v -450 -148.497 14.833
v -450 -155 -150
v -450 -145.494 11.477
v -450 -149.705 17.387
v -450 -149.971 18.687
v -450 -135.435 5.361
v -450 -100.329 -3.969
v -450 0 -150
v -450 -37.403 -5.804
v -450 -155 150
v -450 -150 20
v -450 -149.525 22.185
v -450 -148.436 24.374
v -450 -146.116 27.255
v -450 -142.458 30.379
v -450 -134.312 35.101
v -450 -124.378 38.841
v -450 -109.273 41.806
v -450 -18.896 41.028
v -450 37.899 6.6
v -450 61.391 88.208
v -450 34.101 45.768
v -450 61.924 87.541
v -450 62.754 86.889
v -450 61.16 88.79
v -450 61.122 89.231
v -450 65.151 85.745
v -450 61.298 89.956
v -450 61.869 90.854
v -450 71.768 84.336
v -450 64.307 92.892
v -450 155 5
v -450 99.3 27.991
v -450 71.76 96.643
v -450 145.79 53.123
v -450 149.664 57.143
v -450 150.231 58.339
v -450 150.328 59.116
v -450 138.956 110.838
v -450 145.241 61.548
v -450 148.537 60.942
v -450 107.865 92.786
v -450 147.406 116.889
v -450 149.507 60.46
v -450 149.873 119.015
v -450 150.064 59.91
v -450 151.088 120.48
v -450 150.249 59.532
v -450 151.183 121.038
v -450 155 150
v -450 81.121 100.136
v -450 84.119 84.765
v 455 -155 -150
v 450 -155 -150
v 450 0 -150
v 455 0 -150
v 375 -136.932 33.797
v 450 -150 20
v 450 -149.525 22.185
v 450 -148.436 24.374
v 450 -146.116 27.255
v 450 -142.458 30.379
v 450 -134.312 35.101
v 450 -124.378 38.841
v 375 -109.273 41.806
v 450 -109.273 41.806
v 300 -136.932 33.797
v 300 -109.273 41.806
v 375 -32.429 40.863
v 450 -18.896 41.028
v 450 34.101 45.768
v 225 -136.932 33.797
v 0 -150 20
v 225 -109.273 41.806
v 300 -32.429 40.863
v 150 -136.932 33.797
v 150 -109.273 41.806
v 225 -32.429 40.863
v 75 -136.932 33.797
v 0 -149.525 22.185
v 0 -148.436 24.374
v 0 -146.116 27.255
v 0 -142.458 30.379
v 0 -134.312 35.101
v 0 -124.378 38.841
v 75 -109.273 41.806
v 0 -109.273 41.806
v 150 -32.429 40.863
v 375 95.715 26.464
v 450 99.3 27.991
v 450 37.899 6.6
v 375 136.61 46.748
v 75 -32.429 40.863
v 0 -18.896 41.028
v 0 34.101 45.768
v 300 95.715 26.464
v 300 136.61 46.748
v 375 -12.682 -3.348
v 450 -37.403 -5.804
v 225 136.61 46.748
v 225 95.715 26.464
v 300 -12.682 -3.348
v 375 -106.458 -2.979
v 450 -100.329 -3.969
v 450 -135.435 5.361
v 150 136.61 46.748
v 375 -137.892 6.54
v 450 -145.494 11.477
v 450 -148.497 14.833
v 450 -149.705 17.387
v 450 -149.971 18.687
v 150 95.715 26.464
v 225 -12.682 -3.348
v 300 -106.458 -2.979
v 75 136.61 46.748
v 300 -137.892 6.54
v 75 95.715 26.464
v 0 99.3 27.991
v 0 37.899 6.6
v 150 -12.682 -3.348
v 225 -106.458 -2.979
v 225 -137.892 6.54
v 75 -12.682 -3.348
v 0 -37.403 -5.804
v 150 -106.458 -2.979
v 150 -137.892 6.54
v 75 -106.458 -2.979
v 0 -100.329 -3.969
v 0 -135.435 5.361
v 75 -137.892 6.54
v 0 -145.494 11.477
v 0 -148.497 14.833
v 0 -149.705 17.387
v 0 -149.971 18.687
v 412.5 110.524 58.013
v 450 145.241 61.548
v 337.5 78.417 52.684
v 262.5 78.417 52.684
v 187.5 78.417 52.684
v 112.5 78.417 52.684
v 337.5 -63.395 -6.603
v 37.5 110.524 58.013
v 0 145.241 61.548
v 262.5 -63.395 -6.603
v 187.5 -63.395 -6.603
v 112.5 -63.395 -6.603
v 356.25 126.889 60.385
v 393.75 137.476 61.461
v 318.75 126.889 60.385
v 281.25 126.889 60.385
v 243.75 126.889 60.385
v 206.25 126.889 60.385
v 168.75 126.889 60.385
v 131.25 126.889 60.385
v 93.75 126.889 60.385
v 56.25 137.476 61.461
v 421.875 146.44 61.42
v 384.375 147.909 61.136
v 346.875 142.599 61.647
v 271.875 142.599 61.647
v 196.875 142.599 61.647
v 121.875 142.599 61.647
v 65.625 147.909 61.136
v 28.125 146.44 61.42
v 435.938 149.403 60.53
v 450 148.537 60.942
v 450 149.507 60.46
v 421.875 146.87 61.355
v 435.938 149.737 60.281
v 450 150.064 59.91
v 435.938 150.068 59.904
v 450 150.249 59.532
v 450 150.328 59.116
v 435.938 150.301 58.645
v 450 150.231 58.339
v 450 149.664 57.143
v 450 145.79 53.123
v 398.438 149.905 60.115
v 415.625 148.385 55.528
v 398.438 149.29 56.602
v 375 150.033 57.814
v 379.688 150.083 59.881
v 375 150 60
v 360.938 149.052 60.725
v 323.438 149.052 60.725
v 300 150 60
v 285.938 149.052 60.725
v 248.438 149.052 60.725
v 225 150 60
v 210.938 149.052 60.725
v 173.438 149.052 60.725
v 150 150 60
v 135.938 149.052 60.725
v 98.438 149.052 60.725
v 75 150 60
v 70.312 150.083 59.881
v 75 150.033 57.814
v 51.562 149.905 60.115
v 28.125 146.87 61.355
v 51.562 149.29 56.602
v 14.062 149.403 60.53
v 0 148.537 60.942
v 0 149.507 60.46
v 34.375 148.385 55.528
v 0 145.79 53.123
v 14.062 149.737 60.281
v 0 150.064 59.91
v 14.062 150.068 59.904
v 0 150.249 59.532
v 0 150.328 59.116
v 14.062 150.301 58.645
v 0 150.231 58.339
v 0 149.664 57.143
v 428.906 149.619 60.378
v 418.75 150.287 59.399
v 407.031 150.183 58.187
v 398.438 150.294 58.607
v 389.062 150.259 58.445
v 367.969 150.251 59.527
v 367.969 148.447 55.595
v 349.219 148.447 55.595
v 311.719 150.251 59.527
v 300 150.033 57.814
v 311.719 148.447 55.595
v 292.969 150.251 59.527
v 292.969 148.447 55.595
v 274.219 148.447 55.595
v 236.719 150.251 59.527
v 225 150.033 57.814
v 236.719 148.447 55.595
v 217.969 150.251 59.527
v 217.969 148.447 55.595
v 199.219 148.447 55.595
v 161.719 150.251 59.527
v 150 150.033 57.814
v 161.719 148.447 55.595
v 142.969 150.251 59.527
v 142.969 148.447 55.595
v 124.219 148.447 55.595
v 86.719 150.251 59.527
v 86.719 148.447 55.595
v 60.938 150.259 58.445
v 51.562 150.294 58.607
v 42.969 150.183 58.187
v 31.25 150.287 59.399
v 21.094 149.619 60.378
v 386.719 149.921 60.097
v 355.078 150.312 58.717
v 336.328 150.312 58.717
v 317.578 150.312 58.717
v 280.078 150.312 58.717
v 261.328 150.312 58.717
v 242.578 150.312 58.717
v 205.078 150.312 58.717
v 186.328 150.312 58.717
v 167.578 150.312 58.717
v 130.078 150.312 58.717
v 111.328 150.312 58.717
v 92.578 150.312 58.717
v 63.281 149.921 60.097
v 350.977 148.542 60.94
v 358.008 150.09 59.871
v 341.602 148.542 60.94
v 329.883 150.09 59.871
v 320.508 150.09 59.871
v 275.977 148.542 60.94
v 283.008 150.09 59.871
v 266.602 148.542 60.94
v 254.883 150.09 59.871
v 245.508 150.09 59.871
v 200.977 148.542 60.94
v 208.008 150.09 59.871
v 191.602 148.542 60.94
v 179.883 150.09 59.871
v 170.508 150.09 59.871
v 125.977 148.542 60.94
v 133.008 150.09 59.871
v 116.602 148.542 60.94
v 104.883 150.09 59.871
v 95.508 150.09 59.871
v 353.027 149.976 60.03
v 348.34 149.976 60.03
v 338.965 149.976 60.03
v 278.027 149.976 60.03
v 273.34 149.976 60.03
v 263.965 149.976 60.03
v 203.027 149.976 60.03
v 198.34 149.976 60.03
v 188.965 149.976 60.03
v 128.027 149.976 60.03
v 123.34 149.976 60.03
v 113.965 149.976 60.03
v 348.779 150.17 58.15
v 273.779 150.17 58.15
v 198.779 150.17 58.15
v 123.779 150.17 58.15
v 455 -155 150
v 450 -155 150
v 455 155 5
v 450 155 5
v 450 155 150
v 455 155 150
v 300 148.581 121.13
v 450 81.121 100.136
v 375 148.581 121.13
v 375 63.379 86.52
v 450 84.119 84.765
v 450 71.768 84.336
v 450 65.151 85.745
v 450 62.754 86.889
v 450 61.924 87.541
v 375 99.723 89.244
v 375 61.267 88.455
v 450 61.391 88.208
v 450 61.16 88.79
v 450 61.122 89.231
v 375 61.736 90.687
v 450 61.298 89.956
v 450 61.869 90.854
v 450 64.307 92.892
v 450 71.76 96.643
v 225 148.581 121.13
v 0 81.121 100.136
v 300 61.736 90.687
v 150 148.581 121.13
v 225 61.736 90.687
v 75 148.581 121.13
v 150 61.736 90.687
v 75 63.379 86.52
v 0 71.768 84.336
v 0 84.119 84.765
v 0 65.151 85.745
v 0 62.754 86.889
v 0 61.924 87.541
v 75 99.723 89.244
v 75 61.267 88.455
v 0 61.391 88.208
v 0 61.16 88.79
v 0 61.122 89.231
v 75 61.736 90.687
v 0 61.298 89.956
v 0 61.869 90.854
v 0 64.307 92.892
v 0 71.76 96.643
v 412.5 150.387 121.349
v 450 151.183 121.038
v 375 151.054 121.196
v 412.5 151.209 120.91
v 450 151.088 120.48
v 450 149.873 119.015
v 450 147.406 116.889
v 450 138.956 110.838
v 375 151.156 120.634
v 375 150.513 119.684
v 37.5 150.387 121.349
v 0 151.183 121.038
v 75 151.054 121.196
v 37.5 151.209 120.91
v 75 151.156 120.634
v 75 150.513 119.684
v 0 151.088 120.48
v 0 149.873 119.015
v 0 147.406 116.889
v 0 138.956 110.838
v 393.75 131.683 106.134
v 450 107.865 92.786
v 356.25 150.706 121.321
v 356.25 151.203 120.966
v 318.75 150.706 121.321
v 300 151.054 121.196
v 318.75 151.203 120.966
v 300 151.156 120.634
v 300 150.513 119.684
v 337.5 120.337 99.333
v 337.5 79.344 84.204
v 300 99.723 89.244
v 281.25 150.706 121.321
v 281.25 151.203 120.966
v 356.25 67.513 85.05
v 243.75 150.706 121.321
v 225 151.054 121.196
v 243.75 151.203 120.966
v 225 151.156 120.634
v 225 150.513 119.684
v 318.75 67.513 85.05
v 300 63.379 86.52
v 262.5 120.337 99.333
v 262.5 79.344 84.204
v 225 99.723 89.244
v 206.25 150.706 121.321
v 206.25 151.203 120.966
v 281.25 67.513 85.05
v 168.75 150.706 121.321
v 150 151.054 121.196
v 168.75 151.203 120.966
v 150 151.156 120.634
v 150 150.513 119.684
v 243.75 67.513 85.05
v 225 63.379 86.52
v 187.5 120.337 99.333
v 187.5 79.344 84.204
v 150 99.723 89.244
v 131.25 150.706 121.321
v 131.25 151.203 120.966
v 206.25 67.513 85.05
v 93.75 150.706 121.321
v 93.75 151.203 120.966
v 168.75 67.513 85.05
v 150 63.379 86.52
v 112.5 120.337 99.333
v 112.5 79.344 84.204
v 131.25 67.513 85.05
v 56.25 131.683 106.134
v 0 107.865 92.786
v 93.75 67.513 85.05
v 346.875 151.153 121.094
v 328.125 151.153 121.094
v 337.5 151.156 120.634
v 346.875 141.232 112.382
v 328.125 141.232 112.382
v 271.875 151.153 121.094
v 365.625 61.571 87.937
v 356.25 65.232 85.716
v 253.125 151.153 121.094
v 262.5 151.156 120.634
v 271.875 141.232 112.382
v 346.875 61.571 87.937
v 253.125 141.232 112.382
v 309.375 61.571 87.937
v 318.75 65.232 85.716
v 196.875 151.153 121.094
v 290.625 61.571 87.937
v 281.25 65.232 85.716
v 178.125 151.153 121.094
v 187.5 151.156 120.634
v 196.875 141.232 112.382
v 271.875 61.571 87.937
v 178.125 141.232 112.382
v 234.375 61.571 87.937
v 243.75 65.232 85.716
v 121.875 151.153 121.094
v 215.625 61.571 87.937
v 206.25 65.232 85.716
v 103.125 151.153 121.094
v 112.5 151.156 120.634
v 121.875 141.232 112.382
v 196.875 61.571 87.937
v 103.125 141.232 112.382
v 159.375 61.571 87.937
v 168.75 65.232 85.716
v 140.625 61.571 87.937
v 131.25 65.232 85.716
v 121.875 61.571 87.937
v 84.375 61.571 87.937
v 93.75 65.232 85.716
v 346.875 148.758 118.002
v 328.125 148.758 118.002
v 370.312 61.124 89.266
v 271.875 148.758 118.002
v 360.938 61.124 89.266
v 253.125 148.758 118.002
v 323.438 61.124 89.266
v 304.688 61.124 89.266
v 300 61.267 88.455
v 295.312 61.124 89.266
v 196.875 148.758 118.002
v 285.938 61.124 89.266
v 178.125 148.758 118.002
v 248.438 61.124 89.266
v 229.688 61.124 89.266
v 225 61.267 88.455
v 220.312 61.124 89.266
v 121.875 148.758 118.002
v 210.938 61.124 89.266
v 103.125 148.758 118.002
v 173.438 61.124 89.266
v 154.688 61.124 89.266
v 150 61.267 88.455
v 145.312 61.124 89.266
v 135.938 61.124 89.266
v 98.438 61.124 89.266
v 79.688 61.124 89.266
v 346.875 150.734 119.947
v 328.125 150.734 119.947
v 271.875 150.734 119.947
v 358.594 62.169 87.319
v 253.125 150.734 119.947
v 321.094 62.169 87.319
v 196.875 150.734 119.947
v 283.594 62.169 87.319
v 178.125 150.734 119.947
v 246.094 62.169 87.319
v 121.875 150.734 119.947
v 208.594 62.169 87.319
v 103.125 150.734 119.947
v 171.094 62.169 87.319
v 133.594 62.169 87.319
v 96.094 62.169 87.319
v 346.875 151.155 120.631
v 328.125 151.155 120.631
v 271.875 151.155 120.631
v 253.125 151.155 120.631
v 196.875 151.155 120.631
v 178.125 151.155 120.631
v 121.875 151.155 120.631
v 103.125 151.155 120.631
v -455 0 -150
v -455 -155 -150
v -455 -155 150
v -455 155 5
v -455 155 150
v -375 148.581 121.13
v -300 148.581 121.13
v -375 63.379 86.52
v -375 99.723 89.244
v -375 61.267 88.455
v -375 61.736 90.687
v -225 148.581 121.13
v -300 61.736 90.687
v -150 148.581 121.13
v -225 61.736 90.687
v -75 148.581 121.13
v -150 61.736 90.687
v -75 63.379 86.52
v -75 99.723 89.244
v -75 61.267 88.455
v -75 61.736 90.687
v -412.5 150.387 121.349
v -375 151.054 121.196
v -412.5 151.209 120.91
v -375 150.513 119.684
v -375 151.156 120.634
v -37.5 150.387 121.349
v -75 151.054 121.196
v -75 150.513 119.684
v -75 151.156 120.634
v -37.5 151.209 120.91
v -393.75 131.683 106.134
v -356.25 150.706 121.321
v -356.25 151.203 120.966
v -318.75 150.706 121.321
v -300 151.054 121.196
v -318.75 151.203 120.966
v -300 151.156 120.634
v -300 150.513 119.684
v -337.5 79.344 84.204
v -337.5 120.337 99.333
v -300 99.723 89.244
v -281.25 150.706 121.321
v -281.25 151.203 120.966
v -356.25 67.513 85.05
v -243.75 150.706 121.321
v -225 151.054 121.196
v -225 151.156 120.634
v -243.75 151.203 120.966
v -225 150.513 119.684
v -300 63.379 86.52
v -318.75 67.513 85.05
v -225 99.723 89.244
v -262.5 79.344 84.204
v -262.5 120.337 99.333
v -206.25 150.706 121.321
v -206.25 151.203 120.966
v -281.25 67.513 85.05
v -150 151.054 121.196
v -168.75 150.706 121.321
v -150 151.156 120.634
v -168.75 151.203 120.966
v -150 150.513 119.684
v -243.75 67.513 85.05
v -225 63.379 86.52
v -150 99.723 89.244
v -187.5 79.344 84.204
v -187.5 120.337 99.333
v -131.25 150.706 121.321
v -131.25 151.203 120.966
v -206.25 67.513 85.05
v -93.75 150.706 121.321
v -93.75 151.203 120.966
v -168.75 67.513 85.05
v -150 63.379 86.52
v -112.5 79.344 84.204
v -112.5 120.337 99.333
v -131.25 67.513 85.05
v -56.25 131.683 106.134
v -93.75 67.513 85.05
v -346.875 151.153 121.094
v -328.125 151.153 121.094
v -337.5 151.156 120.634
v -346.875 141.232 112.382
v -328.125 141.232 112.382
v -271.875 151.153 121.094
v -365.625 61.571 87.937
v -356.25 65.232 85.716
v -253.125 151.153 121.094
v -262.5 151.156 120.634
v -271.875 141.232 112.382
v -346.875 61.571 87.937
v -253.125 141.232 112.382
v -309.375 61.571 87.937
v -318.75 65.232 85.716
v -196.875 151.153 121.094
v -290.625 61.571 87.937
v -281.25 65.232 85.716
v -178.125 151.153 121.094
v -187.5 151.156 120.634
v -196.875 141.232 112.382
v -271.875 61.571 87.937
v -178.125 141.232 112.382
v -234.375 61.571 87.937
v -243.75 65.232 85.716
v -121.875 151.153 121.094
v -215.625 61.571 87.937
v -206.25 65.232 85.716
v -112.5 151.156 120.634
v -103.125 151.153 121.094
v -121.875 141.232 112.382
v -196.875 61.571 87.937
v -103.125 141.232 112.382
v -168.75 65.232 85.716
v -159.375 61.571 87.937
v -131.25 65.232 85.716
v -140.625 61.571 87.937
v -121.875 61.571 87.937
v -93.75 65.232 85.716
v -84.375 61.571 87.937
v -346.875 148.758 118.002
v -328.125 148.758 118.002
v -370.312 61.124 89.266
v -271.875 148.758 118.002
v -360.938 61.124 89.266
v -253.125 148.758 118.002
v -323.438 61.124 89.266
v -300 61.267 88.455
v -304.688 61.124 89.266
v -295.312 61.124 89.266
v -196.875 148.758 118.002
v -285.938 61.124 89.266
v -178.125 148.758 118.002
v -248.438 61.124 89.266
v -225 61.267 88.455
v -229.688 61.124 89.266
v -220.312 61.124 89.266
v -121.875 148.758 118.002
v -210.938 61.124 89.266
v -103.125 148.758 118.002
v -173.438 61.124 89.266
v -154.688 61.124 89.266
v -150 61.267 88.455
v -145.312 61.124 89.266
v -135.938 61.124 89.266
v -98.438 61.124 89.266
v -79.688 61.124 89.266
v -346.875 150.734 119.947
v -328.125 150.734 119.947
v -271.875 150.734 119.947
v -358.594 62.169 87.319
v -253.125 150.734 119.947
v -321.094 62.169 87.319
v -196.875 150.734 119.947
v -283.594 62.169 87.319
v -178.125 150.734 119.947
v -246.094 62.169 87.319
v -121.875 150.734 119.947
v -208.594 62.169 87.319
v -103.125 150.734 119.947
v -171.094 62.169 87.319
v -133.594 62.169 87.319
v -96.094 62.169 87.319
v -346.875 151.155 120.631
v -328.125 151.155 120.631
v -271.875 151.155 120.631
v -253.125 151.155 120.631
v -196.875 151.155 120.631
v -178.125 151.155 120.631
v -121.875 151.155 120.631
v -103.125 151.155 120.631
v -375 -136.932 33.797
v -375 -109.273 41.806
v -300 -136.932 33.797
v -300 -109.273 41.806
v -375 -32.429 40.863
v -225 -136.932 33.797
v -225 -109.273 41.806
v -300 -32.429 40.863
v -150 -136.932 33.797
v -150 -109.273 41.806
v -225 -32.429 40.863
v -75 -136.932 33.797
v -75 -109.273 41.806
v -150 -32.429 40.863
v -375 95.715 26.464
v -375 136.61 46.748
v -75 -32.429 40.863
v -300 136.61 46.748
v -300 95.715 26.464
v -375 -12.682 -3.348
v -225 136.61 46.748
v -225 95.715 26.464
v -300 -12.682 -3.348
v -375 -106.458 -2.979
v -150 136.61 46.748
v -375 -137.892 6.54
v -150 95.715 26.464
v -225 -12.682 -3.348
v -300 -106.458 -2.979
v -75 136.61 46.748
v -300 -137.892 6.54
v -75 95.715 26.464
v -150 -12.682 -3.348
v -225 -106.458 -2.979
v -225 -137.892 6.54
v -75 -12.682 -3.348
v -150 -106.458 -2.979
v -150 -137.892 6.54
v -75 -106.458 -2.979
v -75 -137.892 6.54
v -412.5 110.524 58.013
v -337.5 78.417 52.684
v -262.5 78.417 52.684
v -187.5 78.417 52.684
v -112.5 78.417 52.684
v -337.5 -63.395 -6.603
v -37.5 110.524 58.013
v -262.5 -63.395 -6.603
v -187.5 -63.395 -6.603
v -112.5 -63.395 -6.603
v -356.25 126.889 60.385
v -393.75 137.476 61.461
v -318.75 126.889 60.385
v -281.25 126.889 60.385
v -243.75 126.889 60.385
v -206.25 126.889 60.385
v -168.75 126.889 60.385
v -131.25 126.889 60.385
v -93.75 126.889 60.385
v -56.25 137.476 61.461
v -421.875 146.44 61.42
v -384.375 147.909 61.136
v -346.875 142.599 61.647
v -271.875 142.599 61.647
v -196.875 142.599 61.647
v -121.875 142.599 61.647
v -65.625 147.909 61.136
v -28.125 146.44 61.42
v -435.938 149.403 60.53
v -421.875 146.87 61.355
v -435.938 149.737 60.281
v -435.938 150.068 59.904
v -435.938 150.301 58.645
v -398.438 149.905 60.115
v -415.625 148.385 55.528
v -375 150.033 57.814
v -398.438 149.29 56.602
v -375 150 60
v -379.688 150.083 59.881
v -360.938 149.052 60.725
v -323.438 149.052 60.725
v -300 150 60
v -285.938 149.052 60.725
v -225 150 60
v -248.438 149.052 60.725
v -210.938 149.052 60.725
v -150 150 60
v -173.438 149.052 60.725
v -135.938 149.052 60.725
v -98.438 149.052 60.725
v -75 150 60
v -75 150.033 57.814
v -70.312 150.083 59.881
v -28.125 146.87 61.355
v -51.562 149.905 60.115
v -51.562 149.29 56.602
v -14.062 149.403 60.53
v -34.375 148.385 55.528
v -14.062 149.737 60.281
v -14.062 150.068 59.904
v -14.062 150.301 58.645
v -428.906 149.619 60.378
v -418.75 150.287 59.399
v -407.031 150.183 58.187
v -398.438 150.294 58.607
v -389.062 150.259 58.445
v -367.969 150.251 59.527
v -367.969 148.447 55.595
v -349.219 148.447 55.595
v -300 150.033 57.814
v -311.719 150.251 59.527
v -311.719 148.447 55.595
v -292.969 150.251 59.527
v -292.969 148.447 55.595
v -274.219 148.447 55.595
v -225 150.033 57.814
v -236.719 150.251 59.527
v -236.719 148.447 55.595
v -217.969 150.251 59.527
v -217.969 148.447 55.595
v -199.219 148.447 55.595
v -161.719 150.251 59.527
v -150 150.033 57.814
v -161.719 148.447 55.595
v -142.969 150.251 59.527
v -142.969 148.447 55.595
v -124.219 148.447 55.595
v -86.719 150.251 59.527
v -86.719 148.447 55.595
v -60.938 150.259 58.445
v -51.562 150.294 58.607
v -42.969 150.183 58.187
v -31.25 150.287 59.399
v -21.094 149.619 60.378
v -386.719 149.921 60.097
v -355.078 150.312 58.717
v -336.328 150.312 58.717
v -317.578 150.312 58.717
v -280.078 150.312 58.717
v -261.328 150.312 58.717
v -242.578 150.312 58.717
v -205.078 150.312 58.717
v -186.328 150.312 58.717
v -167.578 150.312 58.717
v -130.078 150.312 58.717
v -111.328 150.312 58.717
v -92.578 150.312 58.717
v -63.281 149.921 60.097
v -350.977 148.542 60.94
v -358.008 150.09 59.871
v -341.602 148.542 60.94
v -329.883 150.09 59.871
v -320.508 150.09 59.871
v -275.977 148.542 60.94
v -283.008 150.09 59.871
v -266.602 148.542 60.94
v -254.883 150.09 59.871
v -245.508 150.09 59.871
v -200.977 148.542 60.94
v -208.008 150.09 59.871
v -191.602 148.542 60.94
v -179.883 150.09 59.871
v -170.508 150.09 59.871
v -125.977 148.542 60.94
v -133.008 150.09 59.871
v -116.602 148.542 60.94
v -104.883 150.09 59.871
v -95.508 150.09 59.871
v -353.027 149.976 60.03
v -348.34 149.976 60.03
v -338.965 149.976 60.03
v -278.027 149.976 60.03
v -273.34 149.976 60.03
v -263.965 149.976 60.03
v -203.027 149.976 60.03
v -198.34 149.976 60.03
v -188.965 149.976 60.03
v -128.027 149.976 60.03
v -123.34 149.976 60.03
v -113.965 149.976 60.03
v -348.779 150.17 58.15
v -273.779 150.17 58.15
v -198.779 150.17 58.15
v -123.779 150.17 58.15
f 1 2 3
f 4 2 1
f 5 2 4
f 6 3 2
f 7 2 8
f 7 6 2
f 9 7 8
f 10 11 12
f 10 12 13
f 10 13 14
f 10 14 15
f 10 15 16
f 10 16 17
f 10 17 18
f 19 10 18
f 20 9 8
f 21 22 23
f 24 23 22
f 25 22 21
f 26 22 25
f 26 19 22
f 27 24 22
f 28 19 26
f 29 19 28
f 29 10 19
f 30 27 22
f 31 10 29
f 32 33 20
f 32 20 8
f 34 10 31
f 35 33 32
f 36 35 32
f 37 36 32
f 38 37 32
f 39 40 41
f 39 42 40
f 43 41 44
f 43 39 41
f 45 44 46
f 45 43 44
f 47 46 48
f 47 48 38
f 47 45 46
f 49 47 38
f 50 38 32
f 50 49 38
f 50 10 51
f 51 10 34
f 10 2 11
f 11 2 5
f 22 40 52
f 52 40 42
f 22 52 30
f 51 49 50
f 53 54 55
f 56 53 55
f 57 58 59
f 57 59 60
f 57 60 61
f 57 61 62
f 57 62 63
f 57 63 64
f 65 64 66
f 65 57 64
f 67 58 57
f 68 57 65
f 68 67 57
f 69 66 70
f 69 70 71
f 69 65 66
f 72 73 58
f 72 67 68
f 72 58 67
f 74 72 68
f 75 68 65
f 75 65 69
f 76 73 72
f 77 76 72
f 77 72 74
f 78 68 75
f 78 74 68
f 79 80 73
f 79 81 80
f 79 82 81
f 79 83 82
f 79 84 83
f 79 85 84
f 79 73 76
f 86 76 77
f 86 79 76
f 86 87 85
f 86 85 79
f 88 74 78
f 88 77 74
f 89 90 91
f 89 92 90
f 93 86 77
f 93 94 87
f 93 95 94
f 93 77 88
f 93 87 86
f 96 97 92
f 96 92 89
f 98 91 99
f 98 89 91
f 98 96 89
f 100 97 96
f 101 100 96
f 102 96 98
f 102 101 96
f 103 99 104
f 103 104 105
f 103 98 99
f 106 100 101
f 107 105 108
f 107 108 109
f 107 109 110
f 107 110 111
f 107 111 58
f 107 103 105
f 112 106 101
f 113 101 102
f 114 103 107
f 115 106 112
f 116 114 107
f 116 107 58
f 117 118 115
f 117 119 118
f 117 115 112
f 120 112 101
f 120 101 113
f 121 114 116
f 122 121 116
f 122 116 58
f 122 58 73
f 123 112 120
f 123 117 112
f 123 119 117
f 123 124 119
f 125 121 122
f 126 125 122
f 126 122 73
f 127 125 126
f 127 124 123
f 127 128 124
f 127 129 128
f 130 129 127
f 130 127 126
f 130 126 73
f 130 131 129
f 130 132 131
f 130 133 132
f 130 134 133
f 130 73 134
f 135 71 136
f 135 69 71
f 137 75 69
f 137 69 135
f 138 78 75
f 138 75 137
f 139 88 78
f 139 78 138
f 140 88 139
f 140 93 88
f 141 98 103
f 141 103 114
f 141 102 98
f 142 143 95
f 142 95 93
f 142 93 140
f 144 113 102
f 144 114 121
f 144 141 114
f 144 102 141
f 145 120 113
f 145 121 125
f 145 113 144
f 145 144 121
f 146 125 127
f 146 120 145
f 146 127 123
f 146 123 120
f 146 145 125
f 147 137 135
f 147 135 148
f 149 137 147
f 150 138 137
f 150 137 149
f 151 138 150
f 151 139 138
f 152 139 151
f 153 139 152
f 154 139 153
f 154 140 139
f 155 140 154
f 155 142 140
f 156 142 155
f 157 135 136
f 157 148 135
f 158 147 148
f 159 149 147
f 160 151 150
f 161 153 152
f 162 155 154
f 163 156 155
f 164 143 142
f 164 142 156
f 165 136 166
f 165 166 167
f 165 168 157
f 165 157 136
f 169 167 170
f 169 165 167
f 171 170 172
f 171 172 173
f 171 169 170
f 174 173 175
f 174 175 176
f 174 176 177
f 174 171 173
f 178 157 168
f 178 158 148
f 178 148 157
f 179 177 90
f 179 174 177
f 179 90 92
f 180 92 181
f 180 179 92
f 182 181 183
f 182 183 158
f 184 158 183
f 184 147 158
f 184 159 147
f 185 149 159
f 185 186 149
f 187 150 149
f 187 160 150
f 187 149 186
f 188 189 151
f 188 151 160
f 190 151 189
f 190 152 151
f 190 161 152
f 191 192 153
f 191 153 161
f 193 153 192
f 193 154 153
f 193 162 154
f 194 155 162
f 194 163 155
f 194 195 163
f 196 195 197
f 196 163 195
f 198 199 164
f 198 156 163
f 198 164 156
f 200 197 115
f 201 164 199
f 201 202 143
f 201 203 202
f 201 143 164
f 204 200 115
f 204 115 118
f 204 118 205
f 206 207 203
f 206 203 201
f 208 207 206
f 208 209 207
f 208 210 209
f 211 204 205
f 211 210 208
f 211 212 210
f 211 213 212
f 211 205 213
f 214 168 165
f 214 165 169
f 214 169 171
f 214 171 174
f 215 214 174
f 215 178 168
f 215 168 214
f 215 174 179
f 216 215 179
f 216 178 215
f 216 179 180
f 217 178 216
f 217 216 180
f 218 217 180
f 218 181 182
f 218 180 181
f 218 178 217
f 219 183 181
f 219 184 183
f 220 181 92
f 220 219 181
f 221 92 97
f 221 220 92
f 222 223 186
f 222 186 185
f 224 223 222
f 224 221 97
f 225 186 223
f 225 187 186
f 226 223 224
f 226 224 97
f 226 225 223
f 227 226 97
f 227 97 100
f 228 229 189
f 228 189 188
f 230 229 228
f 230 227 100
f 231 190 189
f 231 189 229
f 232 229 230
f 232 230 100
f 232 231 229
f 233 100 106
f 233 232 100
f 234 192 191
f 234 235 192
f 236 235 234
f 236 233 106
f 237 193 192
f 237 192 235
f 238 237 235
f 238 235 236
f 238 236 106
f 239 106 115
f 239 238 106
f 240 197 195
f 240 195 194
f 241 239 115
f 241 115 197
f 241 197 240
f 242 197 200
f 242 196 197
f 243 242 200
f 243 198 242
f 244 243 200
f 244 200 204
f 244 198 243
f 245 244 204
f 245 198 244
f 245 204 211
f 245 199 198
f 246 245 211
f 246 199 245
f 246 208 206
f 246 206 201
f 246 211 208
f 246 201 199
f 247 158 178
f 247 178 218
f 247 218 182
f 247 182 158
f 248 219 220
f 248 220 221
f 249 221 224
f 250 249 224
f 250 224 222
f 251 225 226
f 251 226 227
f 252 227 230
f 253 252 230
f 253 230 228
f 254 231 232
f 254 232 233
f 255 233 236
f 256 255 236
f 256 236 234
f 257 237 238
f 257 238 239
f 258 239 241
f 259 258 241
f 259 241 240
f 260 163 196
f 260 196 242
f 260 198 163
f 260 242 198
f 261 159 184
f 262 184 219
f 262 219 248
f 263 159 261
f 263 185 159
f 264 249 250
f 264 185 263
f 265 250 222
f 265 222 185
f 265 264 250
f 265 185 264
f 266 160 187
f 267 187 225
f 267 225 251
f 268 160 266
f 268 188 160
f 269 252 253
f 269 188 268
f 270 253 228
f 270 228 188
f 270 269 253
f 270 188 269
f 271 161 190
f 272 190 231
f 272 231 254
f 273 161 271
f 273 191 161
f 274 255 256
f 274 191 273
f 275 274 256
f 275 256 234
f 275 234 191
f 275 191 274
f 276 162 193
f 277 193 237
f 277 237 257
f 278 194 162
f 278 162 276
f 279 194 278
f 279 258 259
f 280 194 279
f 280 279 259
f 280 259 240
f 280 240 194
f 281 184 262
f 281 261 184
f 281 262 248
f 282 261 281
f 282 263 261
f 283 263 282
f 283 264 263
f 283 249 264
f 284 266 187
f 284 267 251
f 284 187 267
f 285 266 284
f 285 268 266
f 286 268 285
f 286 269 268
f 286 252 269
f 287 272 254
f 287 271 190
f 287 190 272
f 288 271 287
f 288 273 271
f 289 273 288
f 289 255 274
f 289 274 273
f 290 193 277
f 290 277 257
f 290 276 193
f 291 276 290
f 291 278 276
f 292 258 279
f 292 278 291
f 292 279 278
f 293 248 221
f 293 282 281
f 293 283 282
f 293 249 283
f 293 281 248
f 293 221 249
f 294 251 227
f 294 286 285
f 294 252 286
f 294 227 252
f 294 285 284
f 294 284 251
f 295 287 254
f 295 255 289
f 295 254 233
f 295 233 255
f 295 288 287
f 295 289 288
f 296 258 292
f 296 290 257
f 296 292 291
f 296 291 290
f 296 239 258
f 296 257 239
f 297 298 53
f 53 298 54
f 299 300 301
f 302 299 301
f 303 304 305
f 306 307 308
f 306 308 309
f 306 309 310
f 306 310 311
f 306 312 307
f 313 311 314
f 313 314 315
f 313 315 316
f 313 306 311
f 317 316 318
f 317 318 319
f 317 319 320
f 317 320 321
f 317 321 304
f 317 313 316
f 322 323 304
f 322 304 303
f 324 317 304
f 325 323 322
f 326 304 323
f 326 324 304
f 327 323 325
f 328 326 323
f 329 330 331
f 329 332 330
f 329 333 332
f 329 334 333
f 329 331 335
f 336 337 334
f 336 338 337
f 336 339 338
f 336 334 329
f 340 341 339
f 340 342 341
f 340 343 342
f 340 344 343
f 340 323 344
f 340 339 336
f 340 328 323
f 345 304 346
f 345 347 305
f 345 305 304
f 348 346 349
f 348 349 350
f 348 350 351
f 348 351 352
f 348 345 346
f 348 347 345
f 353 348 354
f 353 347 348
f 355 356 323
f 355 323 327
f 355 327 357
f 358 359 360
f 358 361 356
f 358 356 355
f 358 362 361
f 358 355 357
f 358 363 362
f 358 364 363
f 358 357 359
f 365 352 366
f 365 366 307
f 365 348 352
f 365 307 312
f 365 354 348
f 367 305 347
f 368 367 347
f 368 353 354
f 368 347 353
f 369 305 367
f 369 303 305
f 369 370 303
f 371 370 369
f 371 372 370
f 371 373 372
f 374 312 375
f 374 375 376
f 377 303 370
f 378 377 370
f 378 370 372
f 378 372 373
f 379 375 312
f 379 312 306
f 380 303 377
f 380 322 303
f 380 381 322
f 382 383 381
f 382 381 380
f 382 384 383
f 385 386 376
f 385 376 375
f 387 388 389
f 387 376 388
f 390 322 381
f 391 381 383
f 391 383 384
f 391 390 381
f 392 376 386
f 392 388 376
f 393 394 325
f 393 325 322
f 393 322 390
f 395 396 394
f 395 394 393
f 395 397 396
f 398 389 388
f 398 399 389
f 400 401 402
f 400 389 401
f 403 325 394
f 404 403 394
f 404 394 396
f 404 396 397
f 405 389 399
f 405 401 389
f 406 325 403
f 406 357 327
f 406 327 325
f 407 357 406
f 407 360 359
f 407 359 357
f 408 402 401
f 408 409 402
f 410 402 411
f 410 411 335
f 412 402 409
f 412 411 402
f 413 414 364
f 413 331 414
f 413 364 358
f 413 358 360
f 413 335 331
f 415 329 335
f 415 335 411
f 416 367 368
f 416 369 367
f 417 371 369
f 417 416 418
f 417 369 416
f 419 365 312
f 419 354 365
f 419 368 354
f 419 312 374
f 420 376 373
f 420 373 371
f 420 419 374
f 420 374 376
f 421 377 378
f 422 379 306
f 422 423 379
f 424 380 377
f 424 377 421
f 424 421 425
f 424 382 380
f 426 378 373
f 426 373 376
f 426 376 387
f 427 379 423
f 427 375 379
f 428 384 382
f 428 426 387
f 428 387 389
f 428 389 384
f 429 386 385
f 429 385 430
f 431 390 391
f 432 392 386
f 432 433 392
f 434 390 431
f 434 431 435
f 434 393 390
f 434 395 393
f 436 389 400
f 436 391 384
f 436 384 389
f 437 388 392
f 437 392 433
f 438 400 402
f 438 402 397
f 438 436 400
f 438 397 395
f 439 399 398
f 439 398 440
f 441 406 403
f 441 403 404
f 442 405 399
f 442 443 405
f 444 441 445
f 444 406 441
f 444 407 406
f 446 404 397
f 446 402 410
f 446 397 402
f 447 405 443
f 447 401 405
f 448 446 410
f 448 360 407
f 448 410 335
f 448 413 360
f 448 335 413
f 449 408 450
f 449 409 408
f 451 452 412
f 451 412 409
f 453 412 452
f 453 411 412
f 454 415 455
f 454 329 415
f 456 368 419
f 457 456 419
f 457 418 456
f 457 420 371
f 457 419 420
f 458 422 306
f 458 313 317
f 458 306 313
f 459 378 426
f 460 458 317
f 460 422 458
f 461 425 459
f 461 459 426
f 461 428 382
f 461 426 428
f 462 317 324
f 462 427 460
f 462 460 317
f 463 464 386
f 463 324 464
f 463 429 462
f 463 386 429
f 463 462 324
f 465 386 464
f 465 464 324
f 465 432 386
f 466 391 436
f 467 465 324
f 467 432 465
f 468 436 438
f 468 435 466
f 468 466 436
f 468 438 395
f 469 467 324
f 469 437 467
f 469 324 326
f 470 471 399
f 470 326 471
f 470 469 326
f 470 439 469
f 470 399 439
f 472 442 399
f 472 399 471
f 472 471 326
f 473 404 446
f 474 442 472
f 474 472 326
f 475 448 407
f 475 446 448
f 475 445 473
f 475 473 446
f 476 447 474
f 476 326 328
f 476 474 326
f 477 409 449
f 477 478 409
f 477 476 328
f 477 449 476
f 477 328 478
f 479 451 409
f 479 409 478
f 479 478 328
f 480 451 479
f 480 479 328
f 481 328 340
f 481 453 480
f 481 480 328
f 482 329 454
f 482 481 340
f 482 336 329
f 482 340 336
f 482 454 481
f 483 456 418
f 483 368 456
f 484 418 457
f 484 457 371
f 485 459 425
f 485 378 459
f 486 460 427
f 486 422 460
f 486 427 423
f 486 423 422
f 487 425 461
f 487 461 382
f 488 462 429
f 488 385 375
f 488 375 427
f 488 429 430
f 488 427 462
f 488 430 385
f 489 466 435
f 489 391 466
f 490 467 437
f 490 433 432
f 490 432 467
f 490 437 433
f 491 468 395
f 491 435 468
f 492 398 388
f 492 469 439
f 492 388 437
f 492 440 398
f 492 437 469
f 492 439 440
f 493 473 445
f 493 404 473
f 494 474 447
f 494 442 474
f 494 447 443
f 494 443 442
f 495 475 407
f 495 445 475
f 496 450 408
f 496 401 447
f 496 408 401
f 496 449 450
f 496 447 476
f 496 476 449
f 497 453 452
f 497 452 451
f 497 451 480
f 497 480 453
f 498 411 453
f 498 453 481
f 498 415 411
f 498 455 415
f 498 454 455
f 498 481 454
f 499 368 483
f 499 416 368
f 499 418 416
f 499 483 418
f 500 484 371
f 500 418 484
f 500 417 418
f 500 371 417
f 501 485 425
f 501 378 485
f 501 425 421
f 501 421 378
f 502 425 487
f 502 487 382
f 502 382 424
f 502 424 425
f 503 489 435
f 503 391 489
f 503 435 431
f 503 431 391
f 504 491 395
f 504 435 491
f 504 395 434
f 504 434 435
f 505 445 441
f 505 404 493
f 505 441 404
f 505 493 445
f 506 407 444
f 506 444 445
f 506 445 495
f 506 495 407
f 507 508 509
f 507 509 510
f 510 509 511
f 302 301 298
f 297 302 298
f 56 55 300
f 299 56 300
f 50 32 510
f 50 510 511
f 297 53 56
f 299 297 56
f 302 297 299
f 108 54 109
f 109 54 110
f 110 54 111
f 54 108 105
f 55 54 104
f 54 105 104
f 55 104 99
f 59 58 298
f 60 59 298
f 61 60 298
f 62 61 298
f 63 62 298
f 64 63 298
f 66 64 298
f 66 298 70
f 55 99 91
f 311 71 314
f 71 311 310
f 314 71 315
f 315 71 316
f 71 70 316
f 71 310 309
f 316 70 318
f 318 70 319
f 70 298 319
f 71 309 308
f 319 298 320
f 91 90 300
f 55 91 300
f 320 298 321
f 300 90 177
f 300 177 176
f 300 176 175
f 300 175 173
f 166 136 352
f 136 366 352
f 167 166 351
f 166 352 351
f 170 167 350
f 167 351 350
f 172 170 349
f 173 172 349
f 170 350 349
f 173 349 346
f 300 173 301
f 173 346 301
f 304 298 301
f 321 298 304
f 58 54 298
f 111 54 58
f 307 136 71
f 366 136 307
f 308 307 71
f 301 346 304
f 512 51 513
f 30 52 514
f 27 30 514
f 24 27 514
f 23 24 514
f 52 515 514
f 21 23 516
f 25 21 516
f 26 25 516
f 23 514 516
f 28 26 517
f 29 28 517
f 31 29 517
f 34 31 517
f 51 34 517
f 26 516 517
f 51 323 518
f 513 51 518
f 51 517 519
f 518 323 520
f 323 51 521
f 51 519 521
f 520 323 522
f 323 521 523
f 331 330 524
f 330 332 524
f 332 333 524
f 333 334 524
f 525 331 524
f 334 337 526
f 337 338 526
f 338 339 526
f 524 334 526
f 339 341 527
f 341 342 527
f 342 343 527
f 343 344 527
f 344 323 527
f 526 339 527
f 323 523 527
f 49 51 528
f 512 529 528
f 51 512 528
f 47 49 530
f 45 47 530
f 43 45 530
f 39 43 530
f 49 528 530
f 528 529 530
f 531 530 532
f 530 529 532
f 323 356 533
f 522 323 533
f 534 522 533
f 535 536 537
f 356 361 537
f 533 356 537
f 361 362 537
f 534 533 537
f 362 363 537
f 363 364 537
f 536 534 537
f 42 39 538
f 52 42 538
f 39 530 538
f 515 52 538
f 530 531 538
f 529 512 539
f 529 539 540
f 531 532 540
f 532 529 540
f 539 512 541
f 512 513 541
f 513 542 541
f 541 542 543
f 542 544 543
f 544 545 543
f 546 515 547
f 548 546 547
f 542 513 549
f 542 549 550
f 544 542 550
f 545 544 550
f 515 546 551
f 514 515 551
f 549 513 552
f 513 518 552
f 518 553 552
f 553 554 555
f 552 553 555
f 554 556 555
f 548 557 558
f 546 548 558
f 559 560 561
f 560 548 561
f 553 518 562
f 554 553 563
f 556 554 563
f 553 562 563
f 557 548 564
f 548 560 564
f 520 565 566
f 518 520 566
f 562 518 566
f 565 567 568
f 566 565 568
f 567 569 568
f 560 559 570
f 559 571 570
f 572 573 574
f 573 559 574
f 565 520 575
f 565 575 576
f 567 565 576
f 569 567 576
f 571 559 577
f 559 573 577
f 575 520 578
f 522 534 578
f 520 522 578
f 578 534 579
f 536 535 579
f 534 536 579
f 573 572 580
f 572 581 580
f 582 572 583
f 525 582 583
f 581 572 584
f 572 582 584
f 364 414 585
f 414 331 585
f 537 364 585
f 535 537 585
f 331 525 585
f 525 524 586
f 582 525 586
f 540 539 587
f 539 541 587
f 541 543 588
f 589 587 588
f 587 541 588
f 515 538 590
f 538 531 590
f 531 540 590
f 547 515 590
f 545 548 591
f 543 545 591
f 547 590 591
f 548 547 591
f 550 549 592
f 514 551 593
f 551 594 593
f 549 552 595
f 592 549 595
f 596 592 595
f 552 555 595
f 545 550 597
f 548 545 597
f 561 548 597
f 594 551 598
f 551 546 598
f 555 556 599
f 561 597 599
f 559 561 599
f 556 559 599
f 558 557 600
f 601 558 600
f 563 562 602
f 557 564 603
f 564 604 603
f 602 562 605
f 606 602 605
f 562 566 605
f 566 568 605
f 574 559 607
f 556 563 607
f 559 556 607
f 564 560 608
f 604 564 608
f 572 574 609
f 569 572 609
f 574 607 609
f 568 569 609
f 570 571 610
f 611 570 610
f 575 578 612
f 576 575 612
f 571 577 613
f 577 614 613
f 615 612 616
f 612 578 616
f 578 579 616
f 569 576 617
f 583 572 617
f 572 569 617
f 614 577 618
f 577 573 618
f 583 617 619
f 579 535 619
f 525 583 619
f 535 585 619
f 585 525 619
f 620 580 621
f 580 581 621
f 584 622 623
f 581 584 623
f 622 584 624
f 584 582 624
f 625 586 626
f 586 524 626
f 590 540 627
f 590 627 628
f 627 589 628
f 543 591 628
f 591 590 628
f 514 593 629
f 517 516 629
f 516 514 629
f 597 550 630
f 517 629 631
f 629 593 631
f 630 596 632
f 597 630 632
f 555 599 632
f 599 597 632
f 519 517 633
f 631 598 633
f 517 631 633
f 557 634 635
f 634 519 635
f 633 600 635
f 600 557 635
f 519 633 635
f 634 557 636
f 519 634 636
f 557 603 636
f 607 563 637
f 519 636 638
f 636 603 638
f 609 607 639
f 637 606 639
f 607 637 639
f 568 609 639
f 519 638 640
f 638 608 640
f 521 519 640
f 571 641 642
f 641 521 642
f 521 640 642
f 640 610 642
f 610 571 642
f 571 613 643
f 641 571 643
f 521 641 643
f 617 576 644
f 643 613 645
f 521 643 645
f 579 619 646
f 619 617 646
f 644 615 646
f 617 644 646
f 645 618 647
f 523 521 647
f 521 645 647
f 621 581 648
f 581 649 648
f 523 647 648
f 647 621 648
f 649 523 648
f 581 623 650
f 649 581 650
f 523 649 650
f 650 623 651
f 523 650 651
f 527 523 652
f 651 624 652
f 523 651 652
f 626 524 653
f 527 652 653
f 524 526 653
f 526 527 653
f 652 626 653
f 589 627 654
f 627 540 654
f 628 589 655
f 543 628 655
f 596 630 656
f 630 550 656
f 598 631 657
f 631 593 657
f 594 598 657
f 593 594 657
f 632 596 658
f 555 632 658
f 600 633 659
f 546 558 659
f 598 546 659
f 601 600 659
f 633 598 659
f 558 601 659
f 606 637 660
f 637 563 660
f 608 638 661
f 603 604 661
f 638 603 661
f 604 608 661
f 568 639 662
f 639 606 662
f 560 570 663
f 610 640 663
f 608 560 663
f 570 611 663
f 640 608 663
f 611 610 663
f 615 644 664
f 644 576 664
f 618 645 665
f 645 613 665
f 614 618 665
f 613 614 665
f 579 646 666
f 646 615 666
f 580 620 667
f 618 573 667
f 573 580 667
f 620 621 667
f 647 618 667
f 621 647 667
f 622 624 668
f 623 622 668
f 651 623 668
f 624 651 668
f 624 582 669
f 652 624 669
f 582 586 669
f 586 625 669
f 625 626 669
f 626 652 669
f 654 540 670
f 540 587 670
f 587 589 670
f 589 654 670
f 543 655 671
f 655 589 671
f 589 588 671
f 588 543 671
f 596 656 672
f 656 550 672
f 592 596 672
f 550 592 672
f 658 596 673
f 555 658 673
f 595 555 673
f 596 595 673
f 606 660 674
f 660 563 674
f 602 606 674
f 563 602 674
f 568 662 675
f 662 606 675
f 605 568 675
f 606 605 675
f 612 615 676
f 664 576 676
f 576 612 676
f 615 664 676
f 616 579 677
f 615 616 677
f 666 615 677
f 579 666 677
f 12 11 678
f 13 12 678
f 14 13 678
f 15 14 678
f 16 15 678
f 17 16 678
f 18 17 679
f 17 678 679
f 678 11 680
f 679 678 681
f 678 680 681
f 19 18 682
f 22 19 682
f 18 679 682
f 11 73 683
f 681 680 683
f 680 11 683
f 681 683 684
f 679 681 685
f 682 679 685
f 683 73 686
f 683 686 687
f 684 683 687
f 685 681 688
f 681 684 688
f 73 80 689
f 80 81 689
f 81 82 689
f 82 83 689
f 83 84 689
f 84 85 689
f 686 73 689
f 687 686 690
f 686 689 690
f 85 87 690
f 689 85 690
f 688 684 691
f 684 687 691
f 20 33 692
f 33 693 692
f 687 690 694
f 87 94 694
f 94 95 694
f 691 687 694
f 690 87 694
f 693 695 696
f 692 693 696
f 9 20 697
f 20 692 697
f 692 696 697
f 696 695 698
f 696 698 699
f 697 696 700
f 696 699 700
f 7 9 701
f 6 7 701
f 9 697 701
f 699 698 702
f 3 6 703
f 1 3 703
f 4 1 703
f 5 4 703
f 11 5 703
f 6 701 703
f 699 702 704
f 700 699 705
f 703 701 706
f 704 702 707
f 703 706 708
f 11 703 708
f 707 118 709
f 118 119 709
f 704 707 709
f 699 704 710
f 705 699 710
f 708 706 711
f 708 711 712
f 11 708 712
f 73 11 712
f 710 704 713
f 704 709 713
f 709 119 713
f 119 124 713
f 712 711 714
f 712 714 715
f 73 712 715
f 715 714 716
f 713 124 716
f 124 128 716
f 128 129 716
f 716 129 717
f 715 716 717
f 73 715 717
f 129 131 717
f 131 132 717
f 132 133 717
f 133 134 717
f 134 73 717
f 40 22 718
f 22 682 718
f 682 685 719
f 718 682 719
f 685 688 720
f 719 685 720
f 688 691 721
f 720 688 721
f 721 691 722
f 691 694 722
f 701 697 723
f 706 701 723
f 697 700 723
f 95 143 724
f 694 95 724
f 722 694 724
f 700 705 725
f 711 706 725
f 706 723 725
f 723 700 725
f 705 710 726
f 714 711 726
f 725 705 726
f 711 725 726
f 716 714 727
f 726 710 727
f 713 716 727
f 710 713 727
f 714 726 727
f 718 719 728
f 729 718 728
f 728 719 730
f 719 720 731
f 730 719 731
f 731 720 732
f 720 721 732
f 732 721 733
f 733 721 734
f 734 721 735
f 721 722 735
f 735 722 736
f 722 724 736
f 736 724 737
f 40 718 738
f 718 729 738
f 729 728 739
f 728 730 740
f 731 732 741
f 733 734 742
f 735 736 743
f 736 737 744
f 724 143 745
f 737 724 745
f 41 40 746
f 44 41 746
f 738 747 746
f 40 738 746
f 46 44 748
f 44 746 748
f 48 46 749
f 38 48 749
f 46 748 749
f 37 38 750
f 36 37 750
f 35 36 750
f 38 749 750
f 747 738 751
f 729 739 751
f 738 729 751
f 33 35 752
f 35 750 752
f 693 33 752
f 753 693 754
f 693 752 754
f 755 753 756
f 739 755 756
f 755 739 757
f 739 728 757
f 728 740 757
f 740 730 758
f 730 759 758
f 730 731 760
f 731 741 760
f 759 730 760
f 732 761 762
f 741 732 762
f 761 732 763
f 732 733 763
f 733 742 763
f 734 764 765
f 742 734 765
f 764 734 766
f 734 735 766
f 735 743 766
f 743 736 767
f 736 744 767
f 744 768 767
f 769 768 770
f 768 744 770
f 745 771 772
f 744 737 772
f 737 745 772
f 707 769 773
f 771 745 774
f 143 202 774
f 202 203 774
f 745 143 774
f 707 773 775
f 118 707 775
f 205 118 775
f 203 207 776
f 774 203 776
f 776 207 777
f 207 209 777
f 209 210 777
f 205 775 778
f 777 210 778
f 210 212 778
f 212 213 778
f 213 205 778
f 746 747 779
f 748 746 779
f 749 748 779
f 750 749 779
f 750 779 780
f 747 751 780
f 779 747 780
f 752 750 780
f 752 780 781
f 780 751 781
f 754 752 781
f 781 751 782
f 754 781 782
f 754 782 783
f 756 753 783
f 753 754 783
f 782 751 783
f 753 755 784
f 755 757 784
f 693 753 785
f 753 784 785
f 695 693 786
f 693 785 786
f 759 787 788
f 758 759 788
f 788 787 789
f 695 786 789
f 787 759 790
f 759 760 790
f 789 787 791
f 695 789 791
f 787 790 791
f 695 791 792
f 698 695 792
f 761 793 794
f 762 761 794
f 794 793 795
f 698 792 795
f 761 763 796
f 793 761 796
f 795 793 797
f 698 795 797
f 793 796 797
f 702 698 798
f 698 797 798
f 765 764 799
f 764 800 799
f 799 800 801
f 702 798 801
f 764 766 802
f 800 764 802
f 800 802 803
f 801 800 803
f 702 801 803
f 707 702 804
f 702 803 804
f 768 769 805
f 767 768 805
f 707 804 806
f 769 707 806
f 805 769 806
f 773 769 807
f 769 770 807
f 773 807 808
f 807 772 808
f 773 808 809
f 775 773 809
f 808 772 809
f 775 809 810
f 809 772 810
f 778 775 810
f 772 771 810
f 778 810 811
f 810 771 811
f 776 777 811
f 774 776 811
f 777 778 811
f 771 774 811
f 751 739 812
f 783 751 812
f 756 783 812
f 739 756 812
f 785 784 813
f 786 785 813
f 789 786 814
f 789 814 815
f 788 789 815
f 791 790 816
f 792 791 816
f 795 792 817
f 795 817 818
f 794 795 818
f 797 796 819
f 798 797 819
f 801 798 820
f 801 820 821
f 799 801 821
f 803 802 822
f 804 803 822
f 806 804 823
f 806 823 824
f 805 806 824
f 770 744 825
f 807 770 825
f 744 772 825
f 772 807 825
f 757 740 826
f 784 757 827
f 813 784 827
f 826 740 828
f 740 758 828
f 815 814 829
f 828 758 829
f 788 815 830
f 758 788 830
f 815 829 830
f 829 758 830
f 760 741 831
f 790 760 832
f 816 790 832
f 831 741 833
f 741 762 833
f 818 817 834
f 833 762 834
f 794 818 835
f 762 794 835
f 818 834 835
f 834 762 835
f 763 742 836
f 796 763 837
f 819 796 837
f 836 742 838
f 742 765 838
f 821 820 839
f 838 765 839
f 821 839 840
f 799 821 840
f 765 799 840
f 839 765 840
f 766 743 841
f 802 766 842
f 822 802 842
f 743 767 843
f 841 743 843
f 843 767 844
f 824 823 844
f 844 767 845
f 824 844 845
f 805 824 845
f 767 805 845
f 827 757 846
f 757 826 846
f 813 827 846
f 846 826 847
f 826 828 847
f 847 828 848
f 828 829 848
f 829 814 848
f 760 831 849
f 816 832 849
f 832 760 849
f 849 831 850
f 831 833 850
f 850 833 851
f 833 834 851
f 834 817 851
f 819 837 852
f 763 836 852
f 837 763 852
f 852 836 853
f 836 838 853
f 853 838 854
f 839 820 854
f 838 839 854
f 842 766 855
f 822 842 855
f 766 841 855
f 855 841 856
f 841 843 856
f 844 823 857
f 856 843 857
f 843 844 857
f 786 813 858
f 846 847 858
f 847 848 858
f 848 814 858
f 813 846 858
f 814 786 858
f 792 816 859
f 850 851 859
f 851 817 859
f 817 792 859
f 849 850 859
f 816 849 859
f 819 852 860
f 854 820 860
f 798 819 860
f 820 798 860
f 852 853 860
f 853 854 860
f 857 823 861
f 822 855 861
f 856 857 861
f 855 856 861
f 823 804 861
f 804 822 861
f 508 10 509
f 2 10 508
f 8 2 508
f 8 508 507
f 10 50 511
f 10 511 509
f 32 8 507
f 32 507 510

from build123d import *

# Parameters (mm, degrees)
F1_DEPTH = 450
F3_DEPTH = 5
F6_DEPTH = 450


with BuildPart() as f1:
    # F0 (on Right) → F1 (new body, symmetric)
    with BuildSketch(Plane.YZ):
        with BuildLine():
            add(Edge.make_bspline(
                [(-150, 20), (-149.4534025256, 27.8617049178), (-111.124322052, 51.653037631), (-13.1974217102, 27.9038504844), (215.7806270185, 85.6795659235), (38.1718984796, -8.49973387), (-110.9530645063, -11.0268811483), (-150.5465974744, 12.1382950822), (-150, 20)],
                knots=[0, 0, 0, 0, 0.1019821913, 0.2880448745, 0.4967996604, 0.6763829839, 0.8980178087, 1, 1, 1, 1], degree=3))
        make_face()
    extrude(amount=F1_DEPTH, both=True)

    # F2 (on face) → F3 (join)
    with BuildSketch(Plane.YZ.offset(450)):
        Polygon((155, 150), (-155, 150), (-155, -150), (0, -150), (155, 5), align=None)
    extrude(amount=F3_DEPTH)

    # F4: F1 across plane


with BuildPart() as f1_1:
    add(f1.part)
    add(f1.part.mirror(Plane.YZ))

    # F5 (on Right) → F6 (join, symmetric)
    with BuildSketch(Plane.YZ):
        with BuildLine():
            add(Edge.make_bspline(
                [(81.1209009165, 100.13648171), (94.1973323132, 104.572569634), (116.2023410468, 109.3870300731), (164.7795729164, 128.4313940785), (124.1749024324, 100.1007050071), (83.3932977974, 79.6867510477), (51.9479200117, 88.7793222775), (71.4534483391, 96.8568660156), (81.1209009165, 100.13648171)],
                knots=[0, 0, 0, 0, 0.1915403863, 0.3574192266, 0.5162715926, 0.7336246624, 0.8583935063, 1, 1, 1, 1], degree=3))
        make_face()
    extrude(amount=F6_DEPTH, both=True)


solid = f1_1.part
